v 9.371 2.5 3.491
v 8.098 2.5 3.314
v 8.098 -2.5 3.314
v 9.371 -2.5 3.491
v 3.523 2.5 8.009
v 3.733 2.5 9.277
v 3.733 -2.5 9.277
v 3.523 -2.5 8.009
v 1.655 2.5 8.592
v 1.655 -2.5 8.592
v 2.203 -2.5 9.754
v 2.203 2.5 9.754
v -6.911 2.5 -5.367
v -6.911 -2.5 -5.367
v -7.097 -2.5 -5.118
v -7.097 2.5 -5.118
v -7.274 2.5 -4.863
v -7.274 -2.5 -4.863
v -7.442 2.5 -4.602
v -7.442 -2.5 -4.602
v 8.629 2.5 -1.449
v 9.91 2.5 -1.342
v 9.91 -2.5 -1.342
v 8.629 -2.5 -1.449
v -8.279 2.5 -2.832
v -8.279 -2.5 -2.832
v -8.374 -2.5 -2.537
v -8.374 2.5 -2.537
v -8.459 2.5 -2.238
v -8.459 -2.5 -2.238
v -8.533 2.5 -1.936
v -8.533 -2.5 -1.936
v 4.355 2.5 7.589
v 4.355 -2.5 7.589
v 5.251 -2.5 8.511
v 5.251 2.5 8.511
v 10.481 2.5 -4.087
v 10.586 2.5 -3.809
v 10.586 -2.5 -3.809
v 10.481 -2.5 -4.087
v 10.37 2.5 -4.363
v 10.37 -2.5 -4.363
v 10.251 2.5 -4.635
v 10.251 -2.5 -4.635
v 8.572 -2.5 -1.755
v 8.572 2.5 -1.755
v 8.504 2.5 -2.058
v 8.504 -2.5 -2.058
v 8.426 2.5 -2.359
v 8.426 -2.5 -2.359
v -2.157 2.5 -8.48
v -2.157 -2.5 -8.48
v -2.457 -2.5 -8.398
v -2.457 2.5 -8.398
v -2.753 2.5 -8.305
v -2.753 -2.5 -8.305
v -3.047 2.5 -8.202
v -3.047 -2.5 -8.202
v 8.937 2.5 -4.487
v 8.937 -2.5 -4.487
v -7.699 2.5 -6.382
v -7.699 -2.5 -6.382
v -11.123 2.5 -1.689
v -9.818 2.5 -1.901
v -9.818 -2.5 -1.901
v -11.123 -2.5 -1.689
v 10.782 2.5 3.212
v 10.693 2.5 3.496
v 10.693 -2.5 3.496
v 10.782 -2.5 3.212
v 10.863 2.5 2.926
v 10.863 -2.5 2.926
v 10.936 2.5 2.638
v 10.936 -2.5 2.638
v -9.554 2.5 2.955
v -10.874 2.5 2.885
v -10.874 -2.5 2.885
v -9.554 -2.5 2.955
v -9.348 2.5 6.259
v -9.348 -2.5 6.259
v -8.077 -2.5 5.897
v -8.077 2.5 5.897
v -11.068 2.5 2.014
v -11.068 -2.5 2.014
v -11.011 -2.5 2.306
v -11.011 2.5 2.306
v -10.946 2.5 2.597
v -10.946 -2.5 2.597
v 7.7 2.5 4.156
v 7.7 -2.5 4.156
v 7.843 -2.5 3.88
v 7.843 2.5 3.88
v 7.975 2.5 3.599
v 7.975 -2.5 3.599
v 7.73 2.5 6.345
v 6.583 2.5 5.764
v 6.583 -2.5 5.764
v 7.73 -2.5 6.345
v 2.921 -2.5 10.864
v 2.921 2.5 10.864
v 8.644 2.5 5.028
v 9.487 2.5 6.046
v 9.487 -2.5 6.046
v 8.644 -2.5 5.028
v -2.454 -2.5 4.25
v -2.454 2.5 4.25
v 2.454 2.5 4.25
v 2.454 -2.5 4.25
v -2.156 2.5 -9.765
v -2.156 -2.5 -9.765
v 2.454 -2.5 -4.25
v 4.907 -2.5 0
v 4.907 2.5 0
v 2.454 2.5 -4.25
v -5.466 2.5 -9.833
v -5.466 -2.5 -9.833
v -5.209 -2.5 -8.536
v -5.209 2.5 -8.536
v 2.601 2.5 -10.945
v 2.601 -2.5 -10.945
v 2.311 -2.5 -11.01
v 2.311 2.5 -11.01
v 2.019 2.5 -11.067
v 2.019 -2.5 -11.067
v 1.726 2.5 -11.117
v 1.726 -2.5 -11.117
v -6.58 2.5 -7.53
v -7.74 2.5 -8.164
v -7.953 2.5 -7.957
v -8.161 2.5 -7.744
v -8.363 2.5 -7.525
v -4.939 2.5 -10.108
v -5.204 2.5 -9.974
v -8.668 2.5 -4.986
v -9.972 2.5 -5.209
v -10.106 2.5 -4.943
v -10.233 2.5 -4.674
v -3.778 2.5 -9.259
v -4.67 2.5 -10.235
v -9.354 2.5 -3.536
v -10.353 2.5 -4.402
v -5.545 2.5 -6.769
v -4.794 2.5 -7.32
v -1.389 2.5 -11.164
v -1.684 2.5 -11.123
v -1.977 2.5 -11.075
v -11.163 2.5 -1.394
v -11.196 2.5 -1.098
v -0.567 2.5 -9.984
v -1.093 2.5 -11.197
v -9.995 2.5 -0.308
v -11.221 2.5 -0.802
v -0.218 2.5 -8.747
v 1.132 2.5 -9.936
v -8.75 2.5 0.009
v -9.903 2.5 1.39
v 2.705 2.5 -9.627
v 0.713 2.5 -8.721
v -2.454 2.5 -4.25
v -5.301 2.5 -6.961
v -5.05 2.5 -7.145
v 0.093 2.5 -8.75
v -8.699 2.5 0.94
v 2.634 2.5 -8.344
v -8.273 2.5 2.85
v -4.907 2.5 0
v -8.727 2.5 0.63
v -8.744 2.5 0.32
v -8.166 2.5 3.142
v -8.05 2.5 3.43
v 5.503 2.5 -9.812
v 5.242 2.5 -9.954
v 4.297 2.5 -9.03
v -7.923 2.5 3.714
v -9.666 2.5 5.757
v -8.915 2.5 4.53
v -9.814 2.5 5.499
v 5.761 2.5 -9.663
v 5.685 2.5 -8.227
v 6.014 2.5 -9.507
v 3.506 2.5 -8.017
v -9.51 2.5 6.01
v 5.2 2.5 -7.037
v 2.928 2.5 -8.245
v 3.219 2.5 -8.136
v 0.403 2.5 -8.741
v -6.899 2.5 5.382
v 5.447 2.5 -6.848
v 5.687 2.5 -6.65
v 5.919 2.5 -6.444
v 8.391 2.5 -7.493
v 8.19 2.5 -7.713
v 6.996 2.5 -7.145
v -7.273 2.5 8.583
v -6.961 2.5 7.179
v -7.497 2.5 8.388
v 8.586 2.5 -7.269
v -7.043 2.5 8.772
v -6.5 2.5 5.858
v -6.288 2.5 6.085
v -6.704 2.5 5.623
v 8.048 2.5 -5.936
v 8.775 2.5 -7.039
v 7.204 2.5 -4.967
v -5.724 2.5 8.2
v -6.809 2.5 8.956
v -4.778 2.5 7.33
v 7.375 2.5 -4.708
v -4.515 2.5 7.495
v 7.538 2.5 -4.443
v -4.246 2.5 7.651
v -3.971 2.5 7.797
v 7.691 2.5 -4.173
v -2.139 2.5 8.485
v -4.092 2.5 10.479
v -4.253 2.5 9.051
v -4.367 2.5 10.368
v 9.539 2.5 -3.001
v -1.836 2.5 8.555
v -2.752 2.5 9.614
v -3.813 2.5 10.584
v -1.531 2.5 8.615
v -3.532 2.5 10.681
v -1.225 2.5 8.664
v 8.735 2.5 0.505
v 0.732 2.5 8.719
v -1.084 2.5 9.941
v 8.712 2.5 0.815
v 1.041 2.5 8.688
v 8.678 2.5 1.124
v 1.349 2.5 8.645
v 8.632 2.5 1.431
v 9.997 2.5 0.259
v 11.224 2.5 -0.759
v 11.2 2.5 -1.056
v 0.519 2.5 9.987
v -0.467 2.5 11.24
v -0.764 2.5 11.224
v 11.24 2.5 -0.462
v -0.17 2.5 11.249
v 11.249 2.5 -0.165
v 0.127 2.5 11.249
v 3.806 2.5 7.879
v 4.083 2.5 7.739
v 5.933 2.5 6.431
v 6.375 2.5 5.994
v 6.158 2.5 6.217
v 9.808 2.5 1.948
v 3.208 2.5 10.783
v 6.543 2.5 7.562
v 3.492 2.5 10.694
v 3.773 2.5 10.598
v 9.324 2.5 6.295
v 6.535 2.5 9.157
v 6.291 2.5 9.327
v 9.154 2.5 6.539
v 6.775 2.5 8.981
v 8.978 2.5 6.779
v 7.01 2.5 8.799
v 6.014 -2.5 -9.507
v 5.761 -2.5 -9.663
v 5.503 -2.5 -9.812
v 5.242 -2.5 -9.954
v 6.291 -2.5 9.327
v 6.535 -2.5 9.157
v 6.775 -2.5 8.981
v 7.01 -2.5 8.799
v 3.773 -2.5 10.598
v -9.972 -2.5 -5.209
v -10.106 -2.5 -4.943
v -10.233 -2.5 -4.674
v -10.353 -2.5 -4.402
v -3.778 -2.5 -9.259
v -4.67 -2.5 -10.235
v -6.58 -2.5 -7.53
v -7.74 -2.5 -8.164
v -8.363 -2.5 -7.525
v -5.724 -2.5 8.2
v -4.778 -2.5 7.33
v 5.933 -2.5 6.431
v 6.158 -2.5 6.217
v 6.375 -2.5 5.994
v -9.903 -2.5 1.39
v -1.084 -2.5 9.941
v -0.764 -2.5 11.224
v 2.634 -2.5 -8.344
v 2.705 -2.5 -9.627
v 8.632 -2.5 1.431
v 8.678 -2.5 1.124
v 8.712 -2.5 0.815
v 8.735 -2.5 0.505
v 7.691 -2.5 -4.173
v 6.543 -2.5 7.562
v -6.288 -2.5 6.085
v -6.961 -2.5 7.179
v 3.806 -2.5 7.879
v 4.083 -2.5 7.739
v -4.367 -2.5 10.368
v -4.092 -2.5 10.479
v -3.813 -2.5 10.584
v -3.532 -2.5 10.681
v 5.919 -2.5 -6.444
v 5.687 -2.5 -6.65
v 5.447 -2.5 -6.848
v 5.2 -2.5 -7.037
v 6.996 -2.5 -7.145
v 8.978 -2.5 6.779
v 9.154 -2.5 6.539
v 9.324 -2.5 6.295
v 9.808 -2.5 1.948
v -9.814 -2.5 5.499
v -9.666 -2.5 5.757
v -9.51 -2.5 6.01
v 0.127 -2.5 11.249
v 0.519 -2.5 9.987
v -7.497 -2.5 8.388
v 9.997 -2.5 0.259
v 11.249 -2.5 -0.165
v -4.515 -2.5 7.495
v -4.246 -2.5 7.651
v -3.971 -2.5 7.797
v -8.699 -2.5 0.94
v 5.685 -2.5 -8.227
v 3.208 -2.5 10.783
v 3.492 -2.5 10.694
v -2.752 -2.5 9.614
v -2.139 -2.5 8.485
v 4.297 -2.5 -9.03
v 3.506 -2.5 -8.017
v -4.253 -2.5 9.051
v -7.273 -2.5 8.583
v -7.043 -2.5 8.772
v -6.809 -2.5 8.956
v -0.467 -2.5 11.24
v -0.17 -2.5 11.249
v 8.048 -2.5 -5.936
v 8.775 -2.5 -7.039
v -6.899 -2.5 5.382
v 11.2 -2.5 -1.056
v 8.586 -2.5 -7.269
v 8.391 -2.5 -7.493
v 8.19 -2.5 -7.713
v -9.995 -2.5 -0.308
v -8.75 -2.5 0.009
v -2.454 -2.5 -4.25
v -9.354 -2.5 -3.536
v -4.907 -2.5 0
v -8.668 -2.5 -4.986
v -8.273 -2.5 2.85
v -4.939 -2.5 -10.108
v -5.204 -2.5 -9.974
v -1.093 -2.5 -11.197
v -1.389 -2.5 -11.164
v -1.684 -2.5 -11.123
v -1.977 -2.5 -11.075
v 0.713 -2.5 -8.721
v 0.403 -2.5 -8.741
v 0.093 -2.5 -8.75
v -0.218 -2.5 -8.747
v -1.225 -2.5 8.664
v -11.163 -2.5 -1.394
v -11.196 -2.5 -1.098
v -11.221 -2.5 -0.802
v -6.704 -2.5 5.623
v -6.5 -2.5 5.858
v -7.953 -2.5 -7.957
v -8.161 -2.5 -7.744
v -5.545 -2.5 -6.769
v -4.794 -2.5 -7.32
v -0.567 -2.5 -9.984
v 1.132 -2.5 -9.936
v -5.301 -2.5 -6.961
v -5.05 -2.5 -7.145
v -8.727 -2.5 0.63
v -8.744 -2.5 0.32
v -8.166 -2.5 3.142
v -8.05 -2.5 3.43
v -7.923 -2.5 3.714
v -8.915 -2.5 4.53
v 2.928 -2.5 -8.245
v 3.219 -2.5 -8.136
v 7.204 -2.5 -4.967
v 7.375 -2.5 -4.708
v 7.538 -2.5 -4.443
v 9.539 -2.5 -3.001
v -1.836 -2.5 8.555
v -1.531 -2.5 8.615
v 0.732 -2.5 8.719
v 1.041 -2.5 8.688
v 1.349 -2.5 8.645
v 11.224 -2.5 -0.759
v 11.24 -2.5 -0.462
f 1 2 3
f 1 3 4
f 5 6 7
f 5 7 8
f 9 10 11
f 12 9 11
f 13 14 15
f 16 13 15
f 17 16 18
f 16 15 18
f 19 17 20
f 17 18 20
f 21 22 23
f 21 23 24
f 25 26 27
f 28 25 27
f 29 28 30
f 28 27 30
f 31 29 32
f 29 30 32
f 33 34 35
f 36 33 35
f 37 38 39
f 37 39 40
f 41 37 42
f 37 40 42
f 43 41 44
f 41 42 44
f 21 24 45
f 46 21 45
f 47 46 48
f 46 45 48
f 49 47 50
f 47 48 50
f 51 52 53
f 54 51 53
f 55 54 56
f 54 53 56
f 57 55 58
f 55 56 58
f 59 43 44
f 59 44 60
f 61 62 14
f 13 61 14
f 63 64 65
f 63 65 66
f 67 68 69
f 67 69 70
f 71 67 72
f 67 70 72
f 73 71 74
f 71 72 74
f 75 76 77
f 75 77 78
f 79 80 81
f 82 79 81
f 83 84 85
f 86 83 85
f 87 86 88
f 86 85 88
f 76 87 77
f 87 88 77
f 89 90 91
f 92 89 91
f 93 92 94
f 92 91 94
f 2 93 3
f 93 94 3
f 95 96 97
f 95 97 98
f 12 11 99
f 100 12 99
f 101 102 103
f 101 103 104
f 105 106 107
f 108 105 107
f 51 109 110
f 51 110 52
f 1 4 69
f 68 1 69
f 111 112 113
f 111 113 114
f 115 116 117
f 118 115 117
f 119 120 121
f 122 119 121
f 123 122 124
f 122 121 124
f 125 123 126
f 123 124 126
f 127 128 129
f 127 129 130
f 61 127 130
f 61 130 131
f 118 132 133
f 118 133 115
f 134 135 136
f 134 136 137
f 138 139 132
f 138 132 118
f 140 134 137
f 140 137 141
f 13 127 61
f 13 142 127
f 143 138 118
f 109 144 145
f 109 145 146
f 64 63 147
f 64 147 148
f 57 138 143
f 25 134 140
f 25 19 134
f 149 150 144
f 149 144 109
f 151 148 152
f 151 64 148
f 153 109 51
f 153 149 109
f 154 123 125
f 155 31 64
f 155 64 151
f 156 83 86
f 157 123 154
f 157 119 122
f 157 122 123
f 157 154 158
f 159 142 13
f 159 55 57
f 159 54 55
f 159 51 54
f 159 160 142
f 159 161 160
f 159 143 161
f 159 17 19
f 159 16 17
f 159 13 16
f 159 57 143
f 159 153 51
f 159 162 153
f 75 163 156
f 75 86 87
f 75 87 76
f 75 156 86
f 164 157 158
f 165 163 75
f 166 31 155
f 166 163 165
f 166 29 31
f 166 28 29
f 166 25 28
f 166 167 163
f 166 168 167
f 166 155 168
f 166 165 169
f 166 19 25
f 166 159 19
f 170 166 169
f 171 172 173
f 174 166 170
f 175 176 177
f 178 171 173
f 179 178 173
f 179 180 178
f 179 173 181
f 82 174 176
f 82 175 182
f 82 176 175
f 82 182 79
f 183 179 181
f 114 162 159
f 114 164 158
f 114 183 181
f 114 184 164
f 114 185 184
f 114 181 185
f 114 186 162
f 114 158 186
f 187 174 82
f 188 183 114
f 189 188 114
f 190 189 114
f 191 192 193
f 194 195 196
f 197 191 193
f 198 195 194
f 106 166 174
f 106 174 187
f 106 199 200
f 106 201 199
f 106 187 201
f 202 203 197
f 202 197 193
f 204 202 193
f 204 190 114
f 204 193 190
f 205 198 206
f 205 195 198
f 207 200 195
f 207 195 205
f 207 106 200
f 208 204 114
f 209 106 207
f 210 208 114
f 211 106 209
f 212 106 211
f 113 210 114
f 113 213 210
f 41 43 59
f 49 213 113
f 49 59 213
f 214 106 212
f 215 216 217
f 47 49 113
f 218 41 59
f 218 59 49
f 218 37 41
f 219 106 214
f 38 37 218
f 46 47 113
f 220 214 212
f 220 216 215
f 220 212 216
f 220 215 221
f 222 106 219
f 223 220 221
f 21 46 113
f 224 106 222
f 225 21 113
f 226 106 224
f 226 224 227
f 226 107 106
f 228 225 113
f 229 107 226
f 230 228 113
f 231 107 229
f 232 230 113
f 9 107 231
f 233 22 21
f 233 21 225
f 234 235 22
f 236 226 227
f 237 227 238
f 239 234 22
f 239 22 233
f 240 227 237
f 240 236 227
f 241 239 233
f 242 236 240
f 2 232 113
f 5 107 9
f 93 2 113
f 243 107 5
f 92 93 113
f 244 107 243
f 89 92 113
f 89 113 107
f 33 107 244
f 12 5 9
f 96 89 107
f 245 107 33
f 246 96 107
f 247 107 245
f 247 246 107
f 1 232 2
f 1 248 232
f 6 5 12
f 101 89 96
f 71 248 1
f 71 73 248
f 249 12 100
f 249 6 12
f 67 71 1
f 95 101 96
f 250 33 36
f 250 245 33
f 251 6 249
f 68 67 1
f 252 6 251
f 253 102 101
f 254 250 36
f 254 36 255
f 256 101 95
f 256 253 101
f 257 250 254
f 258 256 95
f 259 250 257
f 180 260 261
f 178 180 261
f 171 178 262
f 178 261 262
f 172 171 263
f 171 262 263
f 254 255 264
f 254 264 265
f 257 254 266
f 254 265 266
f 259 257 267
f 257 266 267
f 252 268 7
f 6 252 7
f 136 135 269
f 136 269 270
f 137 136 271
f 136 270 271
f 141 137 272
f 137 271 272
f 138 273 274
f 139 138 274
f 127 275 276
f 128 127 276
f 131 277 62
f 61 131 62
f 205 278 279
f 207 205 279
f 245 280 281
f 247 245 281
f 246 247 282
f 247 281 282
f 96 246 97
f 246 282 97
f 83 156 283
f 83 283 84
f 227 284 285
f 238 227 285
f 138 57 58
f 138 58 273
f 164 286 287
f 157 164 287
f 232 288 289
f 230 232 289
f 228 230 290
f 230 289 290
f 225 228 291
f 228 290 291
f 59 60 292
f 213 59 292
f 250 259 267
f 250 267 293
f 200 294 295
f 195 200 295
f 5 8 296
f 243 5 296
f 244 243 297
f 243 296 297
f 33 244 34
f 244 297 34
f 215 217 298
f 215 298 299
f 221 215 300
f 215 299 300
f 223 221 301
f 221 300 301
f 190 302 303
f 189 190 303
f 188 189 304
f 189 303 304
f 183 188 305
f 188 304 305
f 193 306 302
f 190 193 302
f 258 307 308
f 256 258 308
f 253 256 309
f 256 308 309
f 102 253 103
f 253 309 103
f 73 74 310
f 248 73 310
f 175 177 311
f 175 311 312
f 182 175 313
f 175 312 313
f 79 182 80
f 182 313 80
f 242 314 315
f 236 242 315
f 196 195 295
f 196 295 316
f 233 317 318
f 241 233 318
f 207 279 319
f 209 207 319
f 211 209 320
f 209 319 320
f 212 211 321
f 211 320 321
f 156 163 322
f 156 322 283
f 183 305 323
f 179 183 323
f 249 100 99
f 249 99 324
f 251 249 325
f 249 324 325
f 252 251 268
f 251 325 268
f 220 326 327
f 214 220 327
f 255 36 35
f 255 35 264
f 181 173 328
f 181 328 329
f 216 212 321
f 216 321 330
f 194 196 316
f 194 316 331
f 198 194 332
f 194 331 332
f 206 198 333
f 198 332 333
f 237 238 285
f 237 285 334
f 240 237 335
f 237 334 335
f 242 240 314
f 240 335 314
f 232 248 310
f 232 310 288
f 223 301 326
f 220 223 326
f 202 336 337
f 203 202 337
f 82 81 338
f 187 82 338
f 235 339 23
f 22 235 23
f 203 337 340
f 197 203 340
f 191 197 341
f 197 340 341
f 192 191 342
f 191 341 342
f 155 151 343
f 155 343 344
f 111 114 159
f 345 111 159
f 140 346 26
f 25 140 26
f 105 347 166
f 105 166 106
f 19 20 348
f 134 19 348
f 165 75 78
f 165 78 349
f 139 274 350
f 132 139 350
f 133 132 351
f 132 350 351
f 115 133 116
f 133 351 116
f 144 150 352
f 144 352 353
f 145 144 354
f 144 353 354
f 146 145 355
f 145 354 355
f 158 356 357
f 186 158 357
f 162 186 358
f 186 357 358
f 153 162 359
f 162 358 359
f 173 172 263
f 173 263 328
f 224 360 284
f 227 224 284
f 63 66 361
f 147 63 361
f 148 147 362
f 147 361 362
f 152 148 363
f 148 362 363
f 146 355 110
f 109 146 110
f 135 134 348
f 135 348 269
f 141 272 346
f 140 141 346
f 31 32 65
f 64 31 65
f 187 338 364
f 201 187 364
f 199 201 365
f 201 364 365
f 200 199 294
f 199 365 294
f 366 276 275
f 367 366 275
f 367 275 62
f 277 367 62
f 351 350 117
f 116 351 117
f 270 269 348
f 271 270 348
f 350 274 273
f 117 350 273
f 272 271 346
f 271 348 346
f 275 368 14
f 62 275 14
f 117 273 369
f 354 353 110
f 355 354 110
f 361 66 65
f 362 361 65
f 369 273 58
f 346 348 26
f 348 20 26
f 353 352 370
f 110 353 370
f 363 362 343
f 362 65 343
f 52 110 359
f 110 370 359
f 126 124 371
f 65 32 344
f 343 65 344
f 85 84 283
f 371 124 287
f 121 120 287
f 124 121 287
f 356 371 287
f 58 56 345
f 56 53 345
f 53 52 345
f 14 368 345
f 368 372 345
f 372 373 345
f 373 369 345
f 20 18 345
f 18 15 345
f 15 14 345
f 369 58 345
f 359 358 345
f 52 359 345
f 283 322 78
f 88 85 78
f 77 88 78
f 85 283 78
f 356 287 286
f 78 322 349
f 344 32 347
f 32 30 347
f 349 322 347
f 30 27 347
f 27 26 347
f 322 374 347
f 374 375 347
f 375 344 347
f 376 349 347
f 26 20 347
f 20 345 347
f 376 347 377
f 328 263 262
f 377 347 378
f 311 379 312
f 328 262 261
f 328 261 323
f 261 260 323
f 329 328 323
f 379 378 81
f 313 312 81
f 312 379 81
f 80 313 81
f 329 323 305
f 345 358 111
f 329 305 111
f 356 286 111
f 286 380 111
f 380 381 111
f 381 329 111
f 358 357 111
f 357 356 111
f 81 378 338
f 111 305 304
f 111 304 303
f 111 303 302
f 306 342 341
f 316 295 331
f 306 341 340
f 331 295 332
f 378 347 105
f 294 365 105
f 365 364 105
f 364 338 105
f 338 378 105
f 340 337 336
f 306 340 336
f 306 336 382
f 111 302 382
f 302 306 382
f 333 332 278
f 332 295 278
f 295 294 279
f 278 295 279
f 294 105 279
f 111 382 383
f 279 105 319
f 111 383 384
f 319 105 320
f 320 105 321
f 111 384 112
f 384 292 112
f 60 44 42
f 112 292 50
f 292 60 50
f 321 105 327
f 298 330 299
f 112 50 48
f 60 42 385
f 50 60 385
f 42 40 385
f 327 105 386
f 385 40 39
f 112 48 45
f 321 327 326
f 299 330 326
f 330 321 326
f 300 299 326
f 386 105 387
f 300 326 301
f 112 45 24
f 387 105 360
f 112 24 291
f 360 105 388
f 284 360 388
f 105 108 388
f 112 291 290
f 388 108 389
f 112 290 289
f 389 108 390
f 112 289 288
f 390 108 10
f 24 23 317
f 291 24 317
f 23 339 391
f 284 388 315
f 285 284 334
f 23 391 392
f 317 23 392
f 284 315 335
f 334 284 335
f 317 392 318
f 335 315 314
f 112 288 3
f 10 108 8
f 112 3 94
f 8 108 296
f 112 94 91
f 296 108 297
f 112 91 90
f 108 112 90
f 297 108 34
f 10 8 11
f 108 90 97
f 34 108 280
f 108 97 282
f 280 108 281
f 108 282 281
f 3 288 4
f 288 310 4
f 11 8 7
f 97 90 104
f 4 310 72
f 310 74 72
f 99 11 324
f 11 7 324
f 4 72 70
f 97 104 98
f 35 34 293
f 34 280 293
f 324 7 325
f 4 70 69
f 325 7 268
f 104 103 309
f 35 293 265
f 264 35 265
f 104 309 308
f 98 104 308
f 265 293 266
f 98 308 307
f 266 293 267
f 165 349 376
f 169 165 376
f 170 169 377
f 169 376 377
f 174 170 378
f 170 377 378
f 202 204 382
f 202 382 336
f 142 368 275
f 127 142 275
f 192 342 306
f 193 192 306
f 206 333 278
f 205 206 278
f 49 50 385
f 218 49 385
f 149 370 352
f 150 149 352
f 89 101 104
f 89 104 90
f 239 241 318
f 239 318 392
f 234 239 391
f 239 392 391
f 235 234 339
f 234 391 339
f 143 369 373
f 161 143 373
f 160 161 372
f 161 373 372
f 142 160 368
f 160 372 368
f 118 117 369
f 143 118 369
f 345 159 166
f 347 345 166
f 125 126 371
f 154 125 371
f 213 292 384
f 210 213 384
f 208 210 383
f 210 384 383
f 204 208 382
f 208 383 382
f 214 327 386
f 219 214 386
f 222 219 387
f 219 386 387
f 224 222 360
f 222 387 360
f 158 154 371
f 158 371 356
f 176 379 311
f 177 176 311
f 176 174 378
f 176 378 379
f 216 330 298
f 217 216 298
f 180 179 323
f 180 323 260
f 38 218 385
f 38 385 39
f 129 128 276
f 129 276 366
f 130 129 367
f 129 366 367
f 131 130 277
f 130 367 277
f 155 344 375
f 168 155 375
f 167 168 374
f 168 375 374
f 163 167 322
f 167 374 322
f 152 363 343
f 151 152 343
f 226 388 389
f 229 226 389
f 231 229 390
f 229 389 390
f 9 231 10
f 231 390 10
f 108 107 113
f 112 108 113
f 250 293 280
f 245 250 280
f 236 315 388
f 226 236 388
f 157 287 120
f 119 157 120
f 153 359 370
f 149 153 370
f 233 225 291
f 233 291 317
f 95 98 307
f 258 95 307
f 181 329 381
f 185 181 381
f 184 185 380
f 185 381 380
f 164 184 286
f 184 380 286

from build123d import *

# Parameters (mm, degrees)
BOSS_EXTRUDE1_DEPTH      = 2.5
BOSS_EXTRUDE1_DEPTH_BACK = 2.5
SKETCH3_R                = 11.25
CUT_EXTRUDE1_DEPTH       = 17.105123408
CUT_EXTRUDE1_DEPTH_BACK  = 17.105123408
CUT_EXTRUDE2_DEPTH       = 17.676263216


with BuildPart() as part:
    # Sketch3 → Boss-Extrude1 (new, two sides: drawn at the far end of the back side and taken through both)
    with BuildSketch(Plane(origin=(0, 0, 0), x_dir=(1, 0, 0), z_dir=(0, 1, 0)).offset(-BOSS_EXTRUDE1_DEPTH_BACK)):
        Circle(SKETCH3_R)
    extrude(amount=BOSS_EXTRUDE1_DEPTH + BOSS_EXTRUDE1_DEPTH_BACK)

    # Sketch1 → Cut-Extrude1 (cut, two sides: drawn at the far end of the back side and taken through both)
    with BuildSketch(Plane(origin=(0, 0, 0), x_dir=(1, 0, 0), z_dir=(0, 1, 0)).offset(-CUT_EXTRUDE1_DEPTH_BACK)):
        with BuildLine():
            Line((1.131858911, 9.935738292), (0.713336296, 8.720874459))
            ThreePointArc((0.713336296, 8.720874459), (0.24791183, 8.746487279), (-0.218216182, 8.747278531))
            Line((-0.218216182, 8.747278531), (-0.567253557, 9.983898207))
            Line((-0.567253557, 9.983898207), (-1.093414937, 11.196738086))
            ThreePointArc((-1.093414937, 11.196738086), (0.318743782, 11.245483645), (1.725874204, 11.116827705))
            Line((1.725874204, 11.116827705), (1.131858911, 9.935738292))
        make_face()
        with BuildLine():
            Line((4.296660623, 9.029878598), (3.506349076, 8.016733509))
            ThreePointArc((3.506349076, 8.016733509), (3.074459061, 8.192081633), (2.633844069, 8.344181531))
            Line((2.633844069, 8.344181531), (2.705248253, 9.627129992))
            Line((2.705248253, 9.627129992), (2.601404214, 10.945099182))
            ThreePointArc((2.601404214, 10.945099182), (3.952875935, 10.532676386), (5.241989634, 9.954096879))
            Line((5.241989634, 9.954096879), (4.296660623, 9.029878598))
        make_face()
        with BuildLine():
            Line((6.995852487, 7.145491445), (5.919394526, 6.443855092))
            ThreePointArc((5.919394526, 6.443855092), (5.567840946, 6.749936829), (5.200486446, 7.036862989))
            Line((5.200486446, 7.036862989), (5.684594439, 8.227112863))
            Line((5.684594439, 8.227112863), (6.014320853, 9.507388951))
            ThreePointArc((6.014320853, 9.507388951), (7.158652645, 8.678490209), (8.19005415, 7.712685202))
            Line((8.19005415, 7.712685202), (6.995852487, 7.145491445))
        make_face()
        with BuildLine():
            Line((8.936935181, 4.48677942), (7.690981731, 4.172684988))
            ThreePointArc((7.690981731, 4.172684988), (7.457860872, 4.576331633), (7.203575423, 4.966991153))
            Line((7.203575423, 4.966991153), (8.047926613, 5.935560398))
            Line((8.047926613, 5.935560398), (8.775492506, 7.039405605))
            ThreePointArc((8.775492506, 7.039405605), (9.588678264, 5.883854957), (10.250599217, 4.635484408))
            Line((10.250599217, 4.635484408), (8.936935181, 4.48677942))
        make_face()
        with BuildLine():
            Line((9.909562279, 1.341855225), (8.629131728, 1.44933972))
            ThreePointArc((8.629131728, 1.44933972), (8.539705851, 1.906809896), (8.426045228, 2.358868756))
            Line((8.426045228, 2.358868756), (9.539141061, 3.000797864))
            Line((9.539141061, 3.000797864), (10.58570338, 3.808593434))
            ThreePointArc((10.58570338, 3.808593434), (10.979621808, 2.451612724), (11.200332804, 1.055956952))
            Line((11.200332804, 1.055956952), (9.909562279, 1.341855225))
        make_face()
        with BuildLine():
            Line((9.80833454, -1.948479804), (8.632181407, -1.431063996))
            ThreePointArc((8.632181407, -1.431063996), (8.696141194, -0.96934428), (8.735422289, -0.504873673))
            Line((8.735422289, -0.504873673), (9.99664156, -0.25914768))
            Line((9.99664156, -0.25914768), (11.248789039, 0.165061068))
            ThreePointArc((11.248789039, 0.165061068), (11.180752964, -1.246299789), (10.936336541, -2.637999824))
            Line((10.936336541, -2.637999824), (9.80833454, -1.948479804))
        make_face()
        with BuildLine():
            Line((8.644221562, -5.027666813), (7.699800288, -4.156389722))
            ThreePointArc((7.699800288, -4.156389722), (7.910214704, -3.740454963), (8.098180801, -3.313905205))
            Line((8.098180801, -3.313905205), (9.370850832, -3.491010552))
            Line((9.370850832, -3.491010552), (10.692893862, -3.496358227))
            ThreePointArc((10.692893862, -3.496358227), (10.170276048, -4.809156382), (9.487218518, -6.046088387))
            Line((9.487218518, -6.046088387), (8.644221562, -5.027666813))
        make_face()
        with BuildLine():
            Line((6.543373049, -7.56202811), (5.933026334, -6.431306129))
            ThreePointArc((5.933026334, -6.431306129), (6.267093712, -6.106229312), (6.583375767, -5.763823688))
            Line((6.583375767, -5.763823688), (7.729583013, -6.344568263))
            Line((7.729583013, -6.344568263), (8.978257718, -6.778892855))
            ThreePointArc((8.978257718, -6.778892855), (8.057691915, -7.850866258), (7.01001316, -8.798989458))
            Line((7.01001316, -8.798989458), (6.543373049, -7.56202811))
        make_face()
        with BuildLine():
            Line((3.733448535, -9.276926325), (3.523316916, -8.009290725))
            ThreePointArc((3.523316916, -8.009290725), (3.944835871, -7.810298967), (4.355159817, -7.58914244))
            Line((4.355159817, -7.58914244), (5.250694938, -8.510593556))
            Line((5.250694938, -8.510593556), (6.290688039, -9.326829258))
            ThreePointArc((6.290688039, -9.326829258), (5.071931835, -10.041812957), (3.773164105, -10.598383492))
            Line((3.773164105, -10.598383492), (3.733448535, -9.276926325))
        make_face()
        with BuildLine():
            Line((0.518946942, -9.986525626), (0.73180144, -8.719344394))
            ThreePointArc((0.73180144, -8.719344394), (1.195093854, -8.668001539), (1.654994723, -8.59205985))
            Line((1.654994723, -8.59205985), (2.202812593, -9.754363981))
            Line((2.202812593, -9.754363981), (2.9214247, -10.864058989))
            ThreePointArc((2.9214247, -10.864058989), (1.536549241, -11.144573407), (0.127434172, -11.249278223))
            Line((0.127434172, -11.249278223), (0.518946942, -9.986525626))
        make_face()
        with BuildLine():
            Line((-2.751790604, -9.613929918), (-2.139016077, -8.484521803))
            ThreePointArc((-2.139016077, -8.484521803), (-1.684155126, -8.586391647), (-1.224514728, -8.663894256))
            Line((-1.224514728, -8.663894256), (-1.083778676, -9.941097715))
            Line((-1.083778676, -9.941097715), (-0.764420336, -11.223999356))
            ThreePointArc((-0.764420336, -11.223999356), (-2.165342305, -11.039646403), (-3.532105231, -10.681139108))
            Line((-3.532105231, -10.681139108), (-2.751790604, -9.613929918))
        make_face()
        with BuildLine():
            Line((-5.72432894, -8.199515729), (-4.778038012, -7.330269624))
            ThreePointArc((-4.778038012, -7.330269624), (-4.380899766, -7.574312988), (-3.971329009, -7.796861285))
            Line((-3.971329009, -7.796861285), (-4.25292571, -9.050559259))
            Line((-4.25292571, -9.050559259), (-4.367428567, -10.367645235))
            ThreePointArc((-4.367428567, -10.367645235), (-5.632585414, -9.738402413), (-6.808886226, -8.955532836))
            Line((-6.808886226, -8.955532836), (-5.72432894, -8.199515729))
        make_face()
        with BuildLine():
            Line((-8.076547414, -5.896556781), (-6.899285389, -5.38166899))
            ThreePointArc((-6.899285389, -5.38166899), (-6.60290594, -5.741439989), (-6.28778817, -6.084917413))
            Line((-6.28778817, -6.084917413), (-6.961202251, -7.179252274))
            Line((-6.961202251, -7.179252274), (-7.497158145, -8.387795881))
            ThreePointArc((-7.497158145, -8.387795881), (-8.489450494, -7.381851415), (-9.347818747, -6.259455621))
            Line((-9.347818747, -6.259455621), (-8.076547414, -5.896556781))
        make_face()
        with BuildLine():
            Line((-9.553546654, -2.954614412), (-8.272888141, -2.849881016))
            ThreePointArc((-8.272888141, -2.849881016), (-8.1093848, -3.28639288), (-7.922867918, -3.713578323))
            Line((-7.922867918, -3.713578323), (-8.915124515, -4.529961907))
            Line((-8.915124515, -4.529961907), (-9.814454308, -5.498998694))
            ThreePointArc((-9.814454308, -5.498998694), (-10.426351886, -4.225362275), (-10.873770061, -2.885069265))
            Line((-10.873770061, -2.885069265), (-9.553546654, -2.954614412))
        make_face()
        with BuildLine():
            Line((-9.995270876, 0.307506274), (-8.749995096, -0.009264214))
            ThreePointArc((-8.749995096, -0.009264214), (-8.737085987, -0.475214109), (-8.69938199, -0.939815399))
            Line((-8.69938199, -0.939815399), (-9.902954705, -1.389779878))
            Line((-9.902954705, -1.389779878), (-11.068202059, -2.014299673))
            ThreePointArc((-11.068202059, -2.014299673), (-11.233396269, -0.610989569), (-11.221379665, 0.801959113))
            Line((-11.221379665, 0.801959113), (-9.995270876, 0.307506274))
        make_face()
        with BuildLine():
            Line((-9.353852406, 3.536303884), (-8.278904312, 2.83235651))
            ThreePointArc((-8.278904312, 2.83235651), (-8.417988338, 2.387461485), (-8.53318304, 1.935791107))
            Line((-8.53318304, 1.935791107), (-9.817646093, 1.901006365))
            Line((-9.817646093, 1.901006365), (-11.122538377, 1.688679973))
            ThreePointArc((-11.122538377, 1.688679973), (-10.823127863, 3.069593338), (-10.352978664, 4.402082777))
            Line((-10.352978664, 4.402082777), (-9.353852406, 3.536303884))
        make_face()
        with BuildLine():
            Line((-7.698798888, 6.381888097), (-6.910665785, 5.367047457))
            ThreePointArc((-6.910665785, 5.367047457), (-7.186671034, 4.991418581), (-7.442281301, 4.601624609))
            Line((-7.442281301, 4.601624609), (-8.668443189, 4.985789072))
            Line((-8.668443189, 4.985789072), (-9.971575077, 5.208664942))
            ThreePointArc((-9.971575077, 5.208664942), (-9.240005615, 6.417538176), (-8.362671783, 7.525172467))
            Line((-8.362671783, 7.525172467), (-7.698798888, 6.381888097))
        make_face()
        with BuildLine():
            Line((-5.209461051, 8.535895709), (-4.79354939, 7.320135534))
            ThreePointArc((-4.79354939, 7.320135534), (-5.17656641, 7.054478025), (-5.544892904, 6.768800683))
            Line((-5.544892904, 6.768800683), (-6.579879962, 7.53028417))
            Line((-6.579879962, 7.53028417), (-7.740036893, 8.164210243))
            ThreePointArc((-7.740036893, 8.164210243), (-6.655585384, 9.070043175), (-5.466139653, 9.832792955))
            Line((-5.466139653, 9.832792955), (-5.209461051, 8.535895709))
        make_face()
        with BuildLine():
            Line((-2.155597276, 9.764906573), (-2.15697754, 8.479973343))
            ThreePointArc((-2.15697754, 8.479973343), (-2.605500493, 8.353075313), (-3.046629323, 8.202472174))
            Line((-3.046629323, 8.202472174), (-3.778284643, 9.258756134))
            Line((-3.778284643, 9.258756134), (-4.669745613, 10.235036683))
            ThreePointArc((-4.669745613, 10.235036683), (-3.349929206, 10.739668259), (-1.977266476, 11.074877755))
            Line((-1.977266476, 11.074877755), (-2.155597276, 9.764906573))
        make_face()
    extrude(amount=CUT_EXTRUDE1_DEPTH + CUT_EXTRUDE1_DEPTH_BACK, mode=Mode.SUBTRACT)

    # Sketch4 → Cut-Extrude2 (cut, through all)
    with BuildSketch(Plane(origin=(0, 2.5, 0), x_dir=(1, 0, 0), z_dir=(0, 1, 0))):
        Polygon((4.907477288, 0), (2.453738644, 4.25), (-2.453738644, 4.25), (-4.907477288, 0), (-2.453738644, -4.25), (2.453738644, -4.25), align=None)
    extrude(amount=-CUT_EXTRUDE2_DEPTH, mode=Mode.SUBTRACT)


solid = part.part
